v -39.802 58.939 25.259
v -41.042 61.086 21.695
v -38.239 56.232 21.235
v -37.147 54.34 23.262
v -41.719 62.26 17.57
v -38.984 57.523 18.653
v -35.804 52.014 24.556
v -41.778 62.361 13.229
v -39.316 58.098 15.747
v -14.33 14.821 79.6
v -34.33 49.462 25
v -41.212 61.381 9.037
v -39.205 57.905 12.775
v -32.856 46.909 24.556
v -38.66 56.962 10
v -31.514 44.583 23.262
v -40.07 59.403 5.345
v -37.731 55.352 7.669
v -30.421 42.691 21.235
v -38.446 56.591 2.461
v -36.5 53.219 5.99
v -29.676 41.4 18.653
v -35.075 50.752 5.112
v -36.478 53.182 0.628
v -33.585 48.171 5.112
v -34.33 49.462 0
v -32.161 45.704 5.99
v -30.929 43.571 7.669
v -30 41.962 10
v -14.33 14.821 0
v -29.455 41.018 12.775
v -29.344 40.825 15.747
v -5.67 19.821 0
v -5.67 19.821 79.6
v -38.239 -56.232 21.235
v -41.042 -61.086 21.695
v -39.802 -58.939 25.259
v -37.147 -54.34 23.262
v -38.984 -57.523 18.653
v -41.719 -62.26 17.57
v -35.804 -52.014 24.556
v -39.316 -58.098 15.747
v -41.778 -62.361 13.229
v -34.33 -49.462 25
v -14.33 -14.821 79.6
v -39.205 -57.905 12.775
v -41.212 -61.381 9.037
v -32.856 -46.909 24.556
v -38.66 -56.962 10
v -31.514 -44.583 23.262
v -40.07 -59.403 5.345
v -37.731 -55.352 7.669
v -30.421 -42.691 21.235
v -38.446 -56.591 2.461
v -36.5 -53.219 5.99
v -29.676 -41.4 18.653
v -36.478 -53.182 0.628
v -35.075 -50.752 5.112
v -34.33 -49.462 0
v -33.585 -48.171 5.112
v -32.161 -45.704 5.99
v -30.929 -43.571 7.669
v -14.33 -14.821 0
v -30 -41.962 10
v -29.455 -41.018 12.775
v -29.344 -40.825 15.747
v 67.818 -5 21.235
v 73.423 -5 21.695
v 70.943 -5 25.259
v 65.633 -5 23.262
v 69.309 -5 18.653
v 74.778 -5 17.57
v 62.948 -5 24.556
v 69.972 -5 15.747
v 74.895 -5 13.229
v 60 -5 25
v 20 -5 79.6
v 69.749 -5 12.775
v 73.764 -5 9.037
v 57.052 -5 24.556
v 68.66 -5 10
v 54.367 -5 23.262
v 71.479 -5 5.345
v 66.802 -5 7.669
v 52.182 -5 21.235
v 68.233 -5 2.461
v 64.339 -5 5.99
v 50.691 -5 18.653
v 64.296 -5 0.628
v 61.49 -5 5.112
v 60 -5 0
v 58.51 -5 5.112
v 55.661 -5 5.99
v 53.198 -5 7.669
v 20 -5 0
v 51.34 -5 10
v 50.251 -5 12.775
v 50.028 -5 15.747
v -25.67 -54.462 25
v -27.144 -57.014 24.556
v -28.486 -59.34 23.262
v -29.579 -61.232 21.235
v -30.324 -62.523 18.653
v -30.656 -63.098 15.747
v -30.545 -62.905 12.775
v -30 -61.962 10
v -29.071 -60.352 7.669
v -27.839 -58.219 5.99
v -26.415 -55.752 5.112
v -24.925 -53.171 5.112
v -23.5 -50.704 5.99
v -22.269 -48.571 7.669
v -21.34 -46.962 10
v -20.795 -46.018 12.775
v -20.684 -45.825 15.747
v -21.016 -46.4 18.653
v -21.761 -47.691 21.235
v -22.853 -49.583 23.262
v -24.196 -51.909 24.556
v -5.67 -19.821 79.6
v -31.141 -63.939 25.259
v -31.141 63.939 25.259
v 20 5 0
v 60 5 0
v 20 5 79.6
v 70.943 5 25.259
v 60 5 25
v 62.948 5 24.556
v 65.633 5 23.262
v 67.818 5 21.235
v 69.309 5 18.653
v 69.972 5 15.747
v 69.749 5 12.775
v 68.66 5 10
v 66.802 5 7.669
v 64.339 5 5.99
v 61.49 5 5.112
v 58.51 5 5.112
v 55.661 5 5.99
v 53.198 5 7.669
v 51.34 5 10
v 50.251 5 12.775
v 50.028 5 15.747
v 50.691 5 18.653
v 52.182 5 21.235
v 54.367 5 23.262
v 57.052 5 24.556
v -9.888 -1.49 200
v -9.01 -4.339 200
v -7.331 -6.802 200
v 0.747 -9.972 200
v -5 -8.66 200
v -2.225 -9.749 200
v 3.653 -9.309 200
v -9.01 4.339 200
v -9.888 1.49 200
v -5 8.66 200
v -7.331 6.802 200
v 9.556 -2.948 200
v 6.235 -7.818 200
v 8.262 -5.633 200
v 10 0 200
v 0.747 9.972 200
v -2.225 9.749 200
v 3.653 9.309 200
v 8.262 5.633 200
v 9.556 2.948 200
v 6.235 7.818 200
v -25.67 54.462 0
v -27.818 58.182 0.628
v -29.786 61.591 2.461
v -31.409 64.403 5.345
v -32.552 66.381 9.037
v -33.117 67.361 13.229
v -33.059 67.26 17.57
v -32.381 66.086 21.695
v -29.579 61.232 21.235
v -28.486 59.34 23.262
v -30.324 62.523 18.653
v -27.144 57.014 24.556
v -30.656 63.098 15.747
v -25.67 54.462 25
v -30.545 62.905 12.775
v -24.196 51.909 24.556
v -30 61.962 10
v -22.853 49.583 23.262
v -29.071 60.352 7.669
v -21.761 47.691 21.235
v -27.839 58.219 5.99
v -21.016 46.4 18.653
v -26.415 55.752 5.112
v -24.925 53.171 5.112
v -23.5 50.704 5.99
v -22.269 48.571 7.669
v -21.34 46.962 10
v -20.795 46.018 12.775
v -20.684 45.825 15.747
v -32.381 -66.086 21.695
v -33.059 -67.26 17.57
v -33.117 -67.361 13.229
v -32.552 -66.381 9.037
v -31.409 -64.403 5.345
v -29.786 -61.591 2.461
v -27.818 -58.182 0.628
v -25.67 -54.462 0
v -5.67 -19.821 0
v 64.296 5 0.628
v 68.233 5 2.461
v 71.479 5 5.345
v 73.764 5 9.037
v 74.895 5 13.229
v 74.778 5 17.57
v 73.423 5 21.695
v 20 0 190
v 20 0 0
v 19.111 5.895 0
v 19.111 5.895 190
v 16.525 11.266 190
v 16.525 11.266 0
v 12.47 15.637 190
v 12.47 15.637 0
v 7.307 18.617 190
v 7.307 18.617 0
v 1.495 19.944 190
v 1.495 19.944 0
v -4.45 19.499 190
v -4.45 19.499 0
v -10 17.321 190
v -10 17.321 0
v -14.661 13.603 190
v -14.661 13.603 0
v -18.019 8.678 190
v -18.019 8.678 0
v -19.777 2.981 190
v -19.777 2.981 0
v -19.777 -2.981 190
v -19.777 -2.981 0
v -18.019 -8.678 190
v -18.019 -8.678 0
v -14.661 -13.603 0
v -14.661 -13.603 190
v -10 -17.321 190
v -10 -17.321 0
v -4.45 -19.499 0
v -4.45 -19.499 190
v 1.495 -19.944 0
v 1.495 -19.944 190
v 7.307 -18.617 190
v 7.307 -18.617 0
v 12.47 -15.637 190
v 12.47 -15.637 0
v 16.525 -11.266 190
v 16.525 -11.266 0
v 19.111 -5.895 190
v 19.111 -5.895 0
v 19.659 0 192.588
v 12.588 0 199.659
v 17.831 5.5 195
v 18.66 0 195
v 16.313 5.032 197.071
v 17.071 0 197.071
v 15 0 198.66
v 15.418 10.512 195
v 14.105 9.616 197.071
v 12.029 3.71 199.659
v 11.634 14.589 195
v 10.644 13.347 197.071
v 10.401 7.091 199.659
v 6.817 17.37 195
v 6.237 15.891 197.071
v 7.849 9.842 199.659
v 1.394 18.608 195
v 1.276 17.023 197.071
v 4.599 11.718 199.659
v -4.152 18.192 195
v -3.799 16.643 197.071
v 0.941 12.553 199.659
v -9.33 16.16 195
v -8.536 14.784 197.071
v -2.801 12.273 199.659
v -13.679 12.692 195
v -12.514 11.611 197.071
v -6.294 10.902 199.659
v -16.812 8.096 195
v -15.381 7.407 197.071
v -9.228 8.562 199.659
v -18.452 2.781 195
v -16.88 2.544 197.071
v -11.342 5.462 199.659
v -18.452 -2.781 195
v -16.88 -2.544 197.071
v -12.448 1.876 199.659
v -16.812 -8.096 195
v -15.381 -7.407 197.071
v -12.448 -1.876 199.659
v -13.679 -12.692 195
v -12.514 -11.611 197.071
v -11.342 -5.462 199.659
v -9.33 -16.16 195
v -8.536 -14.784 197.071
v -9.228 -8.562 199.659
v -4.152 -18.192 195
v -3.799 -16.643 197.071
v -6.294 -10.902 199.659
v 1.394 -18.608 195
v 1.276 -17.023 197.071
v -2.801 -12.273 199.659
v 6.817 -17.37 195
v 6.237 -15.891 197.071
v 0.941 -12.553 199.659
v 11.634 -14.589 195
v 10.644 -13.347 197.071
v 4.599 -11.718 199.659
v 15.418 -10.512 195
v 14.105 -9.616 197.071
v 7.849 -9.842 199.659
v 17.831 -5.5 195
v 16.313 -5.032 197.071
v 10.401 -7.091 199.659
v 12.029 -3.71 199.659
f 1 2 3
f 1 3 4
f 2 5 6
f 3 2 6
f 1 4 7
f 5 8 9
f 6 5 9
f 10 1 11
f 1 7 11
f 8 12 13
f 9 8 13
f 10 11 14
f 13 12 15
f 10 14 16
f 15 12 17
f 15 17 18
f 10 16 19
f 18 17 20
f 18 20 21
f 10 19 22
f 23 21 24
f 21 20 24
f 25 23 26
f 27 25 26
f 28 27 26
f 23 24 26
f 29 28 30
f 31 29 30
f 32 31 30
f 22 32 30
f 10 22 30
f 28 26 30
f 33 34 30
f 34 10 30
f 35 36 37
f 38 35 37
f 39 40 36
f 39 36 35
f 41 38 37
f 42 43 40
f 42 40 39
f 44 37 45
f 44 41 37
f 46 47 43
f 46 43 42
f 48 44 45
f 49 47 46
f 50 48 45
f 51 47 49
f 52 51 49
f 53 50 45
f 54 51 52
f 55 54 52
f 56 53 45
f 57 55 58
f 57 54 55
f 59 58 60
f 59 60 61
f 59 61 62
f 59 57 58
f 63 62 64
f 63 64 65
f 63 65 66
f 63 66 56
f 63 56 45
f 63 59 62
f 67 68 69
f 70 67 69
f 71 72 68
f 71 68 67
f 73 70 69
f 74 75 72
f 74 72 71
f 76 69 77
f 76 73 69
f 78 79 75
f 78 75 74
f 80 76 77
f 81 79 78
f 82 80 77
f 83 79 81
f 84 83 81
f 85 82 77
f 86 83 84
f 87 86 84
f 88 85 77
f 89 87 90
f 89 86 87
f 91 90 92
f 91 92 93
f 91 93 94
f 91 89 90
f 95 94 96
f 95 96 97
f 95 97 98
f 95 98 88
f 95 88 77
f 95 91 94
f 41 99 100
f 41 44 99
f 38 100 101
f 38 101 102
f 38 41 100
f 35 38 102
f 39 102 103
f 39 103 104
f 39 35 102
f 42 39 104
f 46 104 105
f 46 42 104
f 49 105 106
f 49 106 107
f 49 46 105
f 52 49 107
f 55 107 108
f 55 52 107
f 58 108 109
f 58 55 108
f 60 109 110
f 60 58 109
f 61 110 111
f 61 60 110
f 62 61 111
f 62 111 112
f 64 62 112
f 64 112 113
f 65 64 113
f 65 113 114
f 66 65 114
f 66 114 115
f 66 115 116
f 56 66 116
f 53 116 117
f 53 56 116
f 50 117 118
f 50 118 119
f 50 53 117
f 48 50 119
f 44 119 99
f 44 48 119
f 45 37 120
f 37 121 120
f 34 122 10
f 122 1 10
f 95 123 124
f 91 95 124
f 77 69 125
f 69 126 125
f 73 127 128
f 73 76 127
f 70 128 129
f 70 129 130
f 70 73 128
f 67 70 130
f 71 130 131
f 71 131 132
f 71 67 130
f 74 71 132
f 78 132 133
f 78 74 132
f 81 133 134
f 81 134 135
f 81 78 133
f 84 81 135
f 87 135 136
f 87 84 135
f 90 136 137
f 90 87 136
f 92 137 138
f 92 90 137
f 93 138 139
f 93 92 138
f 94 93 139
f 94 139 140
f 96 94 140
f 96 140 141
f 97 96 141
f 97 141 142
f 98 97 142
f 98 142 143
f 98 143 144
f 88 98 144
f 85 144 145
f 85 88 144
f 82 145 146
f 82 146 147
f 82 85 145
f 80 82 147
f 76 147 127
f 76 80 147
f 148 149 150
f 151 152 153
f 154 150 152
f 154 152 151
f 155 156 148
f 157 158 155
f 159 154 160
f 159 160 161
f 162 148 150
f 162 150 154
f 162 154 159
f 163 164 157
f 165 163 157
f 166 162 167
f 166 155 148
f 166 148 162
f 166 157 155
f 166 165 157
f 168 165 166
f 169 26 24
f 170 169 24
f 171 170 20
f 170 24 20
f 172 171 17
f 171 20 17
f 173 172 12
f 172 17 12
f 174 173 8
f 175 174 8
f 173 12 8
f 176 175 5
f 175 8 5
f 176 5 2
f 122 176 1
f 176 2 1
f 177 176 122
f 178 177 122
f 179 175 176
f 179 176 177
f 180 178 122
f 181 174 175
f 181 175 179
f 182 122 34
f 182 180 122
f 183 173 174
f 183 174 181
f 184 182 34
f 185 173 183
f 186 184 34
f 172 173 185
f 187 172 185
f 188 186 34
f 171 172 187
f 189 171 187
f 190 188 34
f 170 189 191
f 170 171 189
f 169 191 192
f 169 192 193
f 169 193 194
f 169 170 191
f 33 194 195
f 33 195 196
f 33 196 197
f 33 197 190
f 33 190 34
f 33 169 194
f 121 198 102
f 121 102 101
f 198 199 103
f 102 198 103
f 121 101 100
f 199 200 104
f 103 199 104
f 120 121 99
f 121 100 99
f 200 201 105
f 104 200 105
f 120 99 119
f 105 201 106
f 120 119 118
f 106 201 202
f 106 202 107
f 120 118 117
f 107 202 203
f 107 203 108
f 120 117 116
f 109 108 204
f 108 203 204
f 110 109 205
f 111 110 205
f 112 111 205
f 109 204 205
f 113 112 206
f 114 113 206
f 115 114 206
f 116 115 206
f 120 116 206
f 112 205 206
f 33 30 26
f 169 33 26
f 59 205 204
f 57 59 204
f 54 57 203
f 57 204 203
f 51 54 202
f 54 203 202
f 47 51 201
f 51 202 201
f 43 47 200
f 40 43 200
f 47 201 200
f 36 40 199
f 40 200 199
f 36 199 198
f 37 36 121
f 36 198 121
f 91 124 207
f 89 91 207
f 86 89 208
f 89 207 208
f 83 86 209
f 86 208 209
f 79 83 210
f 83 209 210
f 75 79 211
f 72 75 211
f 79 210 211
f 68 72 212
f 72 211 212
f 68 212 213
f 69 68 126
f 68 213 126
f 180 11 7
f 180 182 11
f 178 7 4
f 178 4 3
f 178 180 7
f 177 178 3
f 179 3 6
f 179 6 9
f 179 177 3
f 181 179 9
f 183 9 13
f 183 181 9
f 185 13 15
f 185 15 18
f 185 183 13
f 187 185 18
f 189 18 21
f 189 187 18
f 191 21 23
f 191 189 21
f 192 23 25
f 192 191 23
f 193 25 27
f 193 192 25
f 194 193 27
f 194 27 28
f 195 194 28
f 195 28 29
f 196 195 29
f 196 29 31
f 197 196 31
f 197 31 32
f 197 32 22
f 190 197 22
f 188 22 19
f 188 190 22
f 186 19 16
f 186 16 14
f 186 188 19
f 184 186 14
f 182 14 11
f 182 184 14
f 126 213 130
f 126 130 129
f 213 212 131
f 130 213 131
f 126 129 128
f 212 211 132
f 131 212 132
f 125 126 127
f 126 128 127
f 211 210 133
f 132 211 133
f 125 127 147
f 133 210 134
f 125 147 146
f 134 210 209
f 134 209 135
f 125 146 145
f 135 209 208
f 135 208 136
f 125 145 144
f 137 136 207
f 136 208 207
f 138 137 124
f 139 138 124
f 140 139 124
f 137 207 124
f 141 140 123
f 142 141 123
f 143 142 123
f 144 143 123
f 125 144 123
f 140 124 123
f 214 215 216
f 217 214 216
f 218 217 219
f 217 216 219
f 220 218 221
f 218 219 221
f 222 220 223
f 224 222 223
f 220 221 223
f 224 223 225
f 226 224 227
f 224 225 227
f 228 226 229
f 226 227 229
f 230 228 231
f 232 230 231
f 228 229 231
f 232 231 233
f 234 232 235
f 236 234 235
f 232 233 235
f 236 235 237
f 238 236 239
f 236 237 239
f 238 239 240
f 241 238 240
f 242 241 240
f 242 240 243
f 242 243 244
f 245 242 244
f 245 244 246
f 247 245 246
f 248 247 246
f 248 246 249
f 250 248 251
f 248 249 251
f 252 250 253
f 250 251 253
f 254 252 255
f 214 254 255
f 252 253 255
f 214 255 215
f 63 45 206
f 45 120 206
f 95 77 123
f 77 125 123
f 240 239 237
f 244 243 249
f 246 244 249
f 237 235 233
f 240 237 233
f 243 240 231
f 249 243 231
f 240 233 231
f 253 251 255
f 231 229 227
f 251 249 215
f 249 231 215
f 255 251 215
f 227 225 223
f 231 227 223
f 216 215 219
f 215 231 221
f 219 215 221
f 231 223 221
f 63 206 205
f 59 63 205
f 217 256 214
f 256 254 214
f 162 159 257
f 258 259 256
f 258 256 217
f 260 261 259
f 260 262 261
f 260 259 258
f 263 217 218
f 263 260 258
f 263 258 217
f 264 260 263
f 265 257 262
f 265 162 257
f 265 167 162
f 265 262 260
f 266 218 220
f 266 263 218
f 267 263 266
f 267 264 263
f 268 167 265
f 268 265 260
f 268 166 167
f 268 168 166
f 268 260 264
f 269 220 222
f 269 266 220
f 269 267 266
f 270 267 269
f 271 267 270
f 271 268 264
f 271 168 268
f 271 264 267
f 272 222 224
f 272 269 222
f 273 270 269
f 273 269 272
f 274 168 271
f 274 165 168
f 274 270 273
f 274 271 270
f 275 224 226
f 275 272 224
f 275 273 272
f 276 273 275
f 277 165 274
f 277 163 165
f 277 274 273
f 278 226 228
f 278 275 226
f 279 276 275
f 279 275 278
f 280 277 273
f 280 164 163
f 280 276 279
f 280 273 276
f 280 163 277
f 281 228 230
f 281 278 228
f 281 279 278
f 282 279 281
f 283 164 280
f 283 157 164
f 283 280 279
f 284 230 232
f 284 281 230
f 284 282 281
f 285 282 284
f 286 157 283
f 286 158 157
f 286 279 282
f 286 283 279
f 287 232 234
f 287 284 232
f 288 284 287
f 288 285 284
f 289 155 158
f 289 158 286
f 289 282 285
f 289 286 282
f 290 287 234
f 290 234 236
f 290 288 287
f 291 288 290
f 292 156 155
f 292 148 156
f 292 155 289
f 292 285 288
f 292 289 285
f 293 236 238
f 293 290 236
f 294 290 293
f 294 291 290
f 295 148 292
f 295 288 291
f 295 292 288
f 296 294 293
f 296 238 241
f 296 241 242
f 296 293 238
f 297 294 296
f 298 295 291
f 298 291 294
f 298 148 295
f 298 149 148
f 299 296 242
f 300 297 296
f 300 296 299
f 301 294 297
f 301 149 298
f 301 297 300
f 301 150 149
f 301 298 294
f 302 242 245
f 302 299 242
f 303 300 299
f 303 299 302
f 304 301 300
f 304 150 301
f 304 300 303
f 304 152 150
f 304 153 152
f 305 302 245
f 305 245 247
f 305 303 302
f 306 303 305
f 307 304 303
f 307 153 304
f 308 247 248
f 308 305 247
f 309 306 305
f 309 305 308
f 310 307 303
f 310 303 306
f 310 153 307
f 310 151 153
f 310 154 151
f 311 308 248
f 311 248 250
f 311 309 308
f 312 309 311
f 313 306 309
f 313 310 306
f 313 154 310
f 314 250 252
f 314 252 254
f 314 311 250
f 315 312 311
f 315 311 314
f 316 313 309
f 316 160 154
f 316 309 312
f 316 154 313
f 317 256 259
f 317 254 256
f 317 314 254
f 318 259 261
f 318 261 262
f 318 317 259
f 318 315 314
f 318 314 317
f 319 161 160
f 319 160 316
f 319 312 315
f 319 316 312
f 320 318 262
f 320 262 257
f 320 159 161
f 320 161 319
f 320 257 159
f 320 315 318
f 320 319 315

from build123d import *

# Parameters (mm, degrees)
SKETCH2_R           = 20
BOSS_EXTRUDE1_DEPTH = 200
FILLET1_R           = 10
SKETCH4_R           = 10
BOSS_EXTRUDE3_DEPTH = 5
CIRPATTERN4_COUNT   = 3


with BuildPart() as part:
    # Sketch2 → Boss-Extrude1 (new body)
    with BuildSketch(Plane.XY):
        Circle(SKETCH2_R)
    extrude(amount=BOSS_EXTRUDE1_DEPTH)

    # Fillet1
    fillet1_edges = [part.edges().sort_by_distance(p)[0] for p in [
        (-20, 0, 200),
    ]]
    fillet(fillet1_edges, radius=FILLET1_R)


with BuildPart() as body_2:
    # Sketch4 → Boss-Extrude3 (new, symmetric)
    with BuildSketch(Plane(origin=(0, 0, 0), x_dir=(1, 0, 0), z_dir=(0, 1, 0))):
        with BuildLine():
            ThreePointArc((60, 0), (73.763798723, -9.036960112), (70.943210773, -25.258954039))
            Line((70.943210773, -25.258954039), (20, -79.6))
            Line((20, -79.6), (20, 0))
            Line((20, 0), (60, 0))
        make_face()
        with Locations(Location((60, -15, 0), (0, 0, 270))):
            Circle(SKETCH4_R, mode=Mode.SUBTRACT)
    extrude(amount=BOSS_EXTRUDE3_DEPTH, both=True)


with BuildPart() as cirpattern4_1:
    # CirPattern4: pattern copy
    add(body_2.part.rotate(Axis((0, 0, 0), (0, 0, 1)), 1 * 360 / CIRPATTERN4_COUNT))


with BuildPart() as cirpattern4_2:
    # CirPattern4: pattern copy
    add(body_2.part.rotate(Axis((0, 0, 0), (0, 0, 1)), 2 * 360 / CIRPATTERN4_COUNT))


solid = Compound([part.part, body_2.part, cirpattern4_1.part, cirpattern4_2.part])
